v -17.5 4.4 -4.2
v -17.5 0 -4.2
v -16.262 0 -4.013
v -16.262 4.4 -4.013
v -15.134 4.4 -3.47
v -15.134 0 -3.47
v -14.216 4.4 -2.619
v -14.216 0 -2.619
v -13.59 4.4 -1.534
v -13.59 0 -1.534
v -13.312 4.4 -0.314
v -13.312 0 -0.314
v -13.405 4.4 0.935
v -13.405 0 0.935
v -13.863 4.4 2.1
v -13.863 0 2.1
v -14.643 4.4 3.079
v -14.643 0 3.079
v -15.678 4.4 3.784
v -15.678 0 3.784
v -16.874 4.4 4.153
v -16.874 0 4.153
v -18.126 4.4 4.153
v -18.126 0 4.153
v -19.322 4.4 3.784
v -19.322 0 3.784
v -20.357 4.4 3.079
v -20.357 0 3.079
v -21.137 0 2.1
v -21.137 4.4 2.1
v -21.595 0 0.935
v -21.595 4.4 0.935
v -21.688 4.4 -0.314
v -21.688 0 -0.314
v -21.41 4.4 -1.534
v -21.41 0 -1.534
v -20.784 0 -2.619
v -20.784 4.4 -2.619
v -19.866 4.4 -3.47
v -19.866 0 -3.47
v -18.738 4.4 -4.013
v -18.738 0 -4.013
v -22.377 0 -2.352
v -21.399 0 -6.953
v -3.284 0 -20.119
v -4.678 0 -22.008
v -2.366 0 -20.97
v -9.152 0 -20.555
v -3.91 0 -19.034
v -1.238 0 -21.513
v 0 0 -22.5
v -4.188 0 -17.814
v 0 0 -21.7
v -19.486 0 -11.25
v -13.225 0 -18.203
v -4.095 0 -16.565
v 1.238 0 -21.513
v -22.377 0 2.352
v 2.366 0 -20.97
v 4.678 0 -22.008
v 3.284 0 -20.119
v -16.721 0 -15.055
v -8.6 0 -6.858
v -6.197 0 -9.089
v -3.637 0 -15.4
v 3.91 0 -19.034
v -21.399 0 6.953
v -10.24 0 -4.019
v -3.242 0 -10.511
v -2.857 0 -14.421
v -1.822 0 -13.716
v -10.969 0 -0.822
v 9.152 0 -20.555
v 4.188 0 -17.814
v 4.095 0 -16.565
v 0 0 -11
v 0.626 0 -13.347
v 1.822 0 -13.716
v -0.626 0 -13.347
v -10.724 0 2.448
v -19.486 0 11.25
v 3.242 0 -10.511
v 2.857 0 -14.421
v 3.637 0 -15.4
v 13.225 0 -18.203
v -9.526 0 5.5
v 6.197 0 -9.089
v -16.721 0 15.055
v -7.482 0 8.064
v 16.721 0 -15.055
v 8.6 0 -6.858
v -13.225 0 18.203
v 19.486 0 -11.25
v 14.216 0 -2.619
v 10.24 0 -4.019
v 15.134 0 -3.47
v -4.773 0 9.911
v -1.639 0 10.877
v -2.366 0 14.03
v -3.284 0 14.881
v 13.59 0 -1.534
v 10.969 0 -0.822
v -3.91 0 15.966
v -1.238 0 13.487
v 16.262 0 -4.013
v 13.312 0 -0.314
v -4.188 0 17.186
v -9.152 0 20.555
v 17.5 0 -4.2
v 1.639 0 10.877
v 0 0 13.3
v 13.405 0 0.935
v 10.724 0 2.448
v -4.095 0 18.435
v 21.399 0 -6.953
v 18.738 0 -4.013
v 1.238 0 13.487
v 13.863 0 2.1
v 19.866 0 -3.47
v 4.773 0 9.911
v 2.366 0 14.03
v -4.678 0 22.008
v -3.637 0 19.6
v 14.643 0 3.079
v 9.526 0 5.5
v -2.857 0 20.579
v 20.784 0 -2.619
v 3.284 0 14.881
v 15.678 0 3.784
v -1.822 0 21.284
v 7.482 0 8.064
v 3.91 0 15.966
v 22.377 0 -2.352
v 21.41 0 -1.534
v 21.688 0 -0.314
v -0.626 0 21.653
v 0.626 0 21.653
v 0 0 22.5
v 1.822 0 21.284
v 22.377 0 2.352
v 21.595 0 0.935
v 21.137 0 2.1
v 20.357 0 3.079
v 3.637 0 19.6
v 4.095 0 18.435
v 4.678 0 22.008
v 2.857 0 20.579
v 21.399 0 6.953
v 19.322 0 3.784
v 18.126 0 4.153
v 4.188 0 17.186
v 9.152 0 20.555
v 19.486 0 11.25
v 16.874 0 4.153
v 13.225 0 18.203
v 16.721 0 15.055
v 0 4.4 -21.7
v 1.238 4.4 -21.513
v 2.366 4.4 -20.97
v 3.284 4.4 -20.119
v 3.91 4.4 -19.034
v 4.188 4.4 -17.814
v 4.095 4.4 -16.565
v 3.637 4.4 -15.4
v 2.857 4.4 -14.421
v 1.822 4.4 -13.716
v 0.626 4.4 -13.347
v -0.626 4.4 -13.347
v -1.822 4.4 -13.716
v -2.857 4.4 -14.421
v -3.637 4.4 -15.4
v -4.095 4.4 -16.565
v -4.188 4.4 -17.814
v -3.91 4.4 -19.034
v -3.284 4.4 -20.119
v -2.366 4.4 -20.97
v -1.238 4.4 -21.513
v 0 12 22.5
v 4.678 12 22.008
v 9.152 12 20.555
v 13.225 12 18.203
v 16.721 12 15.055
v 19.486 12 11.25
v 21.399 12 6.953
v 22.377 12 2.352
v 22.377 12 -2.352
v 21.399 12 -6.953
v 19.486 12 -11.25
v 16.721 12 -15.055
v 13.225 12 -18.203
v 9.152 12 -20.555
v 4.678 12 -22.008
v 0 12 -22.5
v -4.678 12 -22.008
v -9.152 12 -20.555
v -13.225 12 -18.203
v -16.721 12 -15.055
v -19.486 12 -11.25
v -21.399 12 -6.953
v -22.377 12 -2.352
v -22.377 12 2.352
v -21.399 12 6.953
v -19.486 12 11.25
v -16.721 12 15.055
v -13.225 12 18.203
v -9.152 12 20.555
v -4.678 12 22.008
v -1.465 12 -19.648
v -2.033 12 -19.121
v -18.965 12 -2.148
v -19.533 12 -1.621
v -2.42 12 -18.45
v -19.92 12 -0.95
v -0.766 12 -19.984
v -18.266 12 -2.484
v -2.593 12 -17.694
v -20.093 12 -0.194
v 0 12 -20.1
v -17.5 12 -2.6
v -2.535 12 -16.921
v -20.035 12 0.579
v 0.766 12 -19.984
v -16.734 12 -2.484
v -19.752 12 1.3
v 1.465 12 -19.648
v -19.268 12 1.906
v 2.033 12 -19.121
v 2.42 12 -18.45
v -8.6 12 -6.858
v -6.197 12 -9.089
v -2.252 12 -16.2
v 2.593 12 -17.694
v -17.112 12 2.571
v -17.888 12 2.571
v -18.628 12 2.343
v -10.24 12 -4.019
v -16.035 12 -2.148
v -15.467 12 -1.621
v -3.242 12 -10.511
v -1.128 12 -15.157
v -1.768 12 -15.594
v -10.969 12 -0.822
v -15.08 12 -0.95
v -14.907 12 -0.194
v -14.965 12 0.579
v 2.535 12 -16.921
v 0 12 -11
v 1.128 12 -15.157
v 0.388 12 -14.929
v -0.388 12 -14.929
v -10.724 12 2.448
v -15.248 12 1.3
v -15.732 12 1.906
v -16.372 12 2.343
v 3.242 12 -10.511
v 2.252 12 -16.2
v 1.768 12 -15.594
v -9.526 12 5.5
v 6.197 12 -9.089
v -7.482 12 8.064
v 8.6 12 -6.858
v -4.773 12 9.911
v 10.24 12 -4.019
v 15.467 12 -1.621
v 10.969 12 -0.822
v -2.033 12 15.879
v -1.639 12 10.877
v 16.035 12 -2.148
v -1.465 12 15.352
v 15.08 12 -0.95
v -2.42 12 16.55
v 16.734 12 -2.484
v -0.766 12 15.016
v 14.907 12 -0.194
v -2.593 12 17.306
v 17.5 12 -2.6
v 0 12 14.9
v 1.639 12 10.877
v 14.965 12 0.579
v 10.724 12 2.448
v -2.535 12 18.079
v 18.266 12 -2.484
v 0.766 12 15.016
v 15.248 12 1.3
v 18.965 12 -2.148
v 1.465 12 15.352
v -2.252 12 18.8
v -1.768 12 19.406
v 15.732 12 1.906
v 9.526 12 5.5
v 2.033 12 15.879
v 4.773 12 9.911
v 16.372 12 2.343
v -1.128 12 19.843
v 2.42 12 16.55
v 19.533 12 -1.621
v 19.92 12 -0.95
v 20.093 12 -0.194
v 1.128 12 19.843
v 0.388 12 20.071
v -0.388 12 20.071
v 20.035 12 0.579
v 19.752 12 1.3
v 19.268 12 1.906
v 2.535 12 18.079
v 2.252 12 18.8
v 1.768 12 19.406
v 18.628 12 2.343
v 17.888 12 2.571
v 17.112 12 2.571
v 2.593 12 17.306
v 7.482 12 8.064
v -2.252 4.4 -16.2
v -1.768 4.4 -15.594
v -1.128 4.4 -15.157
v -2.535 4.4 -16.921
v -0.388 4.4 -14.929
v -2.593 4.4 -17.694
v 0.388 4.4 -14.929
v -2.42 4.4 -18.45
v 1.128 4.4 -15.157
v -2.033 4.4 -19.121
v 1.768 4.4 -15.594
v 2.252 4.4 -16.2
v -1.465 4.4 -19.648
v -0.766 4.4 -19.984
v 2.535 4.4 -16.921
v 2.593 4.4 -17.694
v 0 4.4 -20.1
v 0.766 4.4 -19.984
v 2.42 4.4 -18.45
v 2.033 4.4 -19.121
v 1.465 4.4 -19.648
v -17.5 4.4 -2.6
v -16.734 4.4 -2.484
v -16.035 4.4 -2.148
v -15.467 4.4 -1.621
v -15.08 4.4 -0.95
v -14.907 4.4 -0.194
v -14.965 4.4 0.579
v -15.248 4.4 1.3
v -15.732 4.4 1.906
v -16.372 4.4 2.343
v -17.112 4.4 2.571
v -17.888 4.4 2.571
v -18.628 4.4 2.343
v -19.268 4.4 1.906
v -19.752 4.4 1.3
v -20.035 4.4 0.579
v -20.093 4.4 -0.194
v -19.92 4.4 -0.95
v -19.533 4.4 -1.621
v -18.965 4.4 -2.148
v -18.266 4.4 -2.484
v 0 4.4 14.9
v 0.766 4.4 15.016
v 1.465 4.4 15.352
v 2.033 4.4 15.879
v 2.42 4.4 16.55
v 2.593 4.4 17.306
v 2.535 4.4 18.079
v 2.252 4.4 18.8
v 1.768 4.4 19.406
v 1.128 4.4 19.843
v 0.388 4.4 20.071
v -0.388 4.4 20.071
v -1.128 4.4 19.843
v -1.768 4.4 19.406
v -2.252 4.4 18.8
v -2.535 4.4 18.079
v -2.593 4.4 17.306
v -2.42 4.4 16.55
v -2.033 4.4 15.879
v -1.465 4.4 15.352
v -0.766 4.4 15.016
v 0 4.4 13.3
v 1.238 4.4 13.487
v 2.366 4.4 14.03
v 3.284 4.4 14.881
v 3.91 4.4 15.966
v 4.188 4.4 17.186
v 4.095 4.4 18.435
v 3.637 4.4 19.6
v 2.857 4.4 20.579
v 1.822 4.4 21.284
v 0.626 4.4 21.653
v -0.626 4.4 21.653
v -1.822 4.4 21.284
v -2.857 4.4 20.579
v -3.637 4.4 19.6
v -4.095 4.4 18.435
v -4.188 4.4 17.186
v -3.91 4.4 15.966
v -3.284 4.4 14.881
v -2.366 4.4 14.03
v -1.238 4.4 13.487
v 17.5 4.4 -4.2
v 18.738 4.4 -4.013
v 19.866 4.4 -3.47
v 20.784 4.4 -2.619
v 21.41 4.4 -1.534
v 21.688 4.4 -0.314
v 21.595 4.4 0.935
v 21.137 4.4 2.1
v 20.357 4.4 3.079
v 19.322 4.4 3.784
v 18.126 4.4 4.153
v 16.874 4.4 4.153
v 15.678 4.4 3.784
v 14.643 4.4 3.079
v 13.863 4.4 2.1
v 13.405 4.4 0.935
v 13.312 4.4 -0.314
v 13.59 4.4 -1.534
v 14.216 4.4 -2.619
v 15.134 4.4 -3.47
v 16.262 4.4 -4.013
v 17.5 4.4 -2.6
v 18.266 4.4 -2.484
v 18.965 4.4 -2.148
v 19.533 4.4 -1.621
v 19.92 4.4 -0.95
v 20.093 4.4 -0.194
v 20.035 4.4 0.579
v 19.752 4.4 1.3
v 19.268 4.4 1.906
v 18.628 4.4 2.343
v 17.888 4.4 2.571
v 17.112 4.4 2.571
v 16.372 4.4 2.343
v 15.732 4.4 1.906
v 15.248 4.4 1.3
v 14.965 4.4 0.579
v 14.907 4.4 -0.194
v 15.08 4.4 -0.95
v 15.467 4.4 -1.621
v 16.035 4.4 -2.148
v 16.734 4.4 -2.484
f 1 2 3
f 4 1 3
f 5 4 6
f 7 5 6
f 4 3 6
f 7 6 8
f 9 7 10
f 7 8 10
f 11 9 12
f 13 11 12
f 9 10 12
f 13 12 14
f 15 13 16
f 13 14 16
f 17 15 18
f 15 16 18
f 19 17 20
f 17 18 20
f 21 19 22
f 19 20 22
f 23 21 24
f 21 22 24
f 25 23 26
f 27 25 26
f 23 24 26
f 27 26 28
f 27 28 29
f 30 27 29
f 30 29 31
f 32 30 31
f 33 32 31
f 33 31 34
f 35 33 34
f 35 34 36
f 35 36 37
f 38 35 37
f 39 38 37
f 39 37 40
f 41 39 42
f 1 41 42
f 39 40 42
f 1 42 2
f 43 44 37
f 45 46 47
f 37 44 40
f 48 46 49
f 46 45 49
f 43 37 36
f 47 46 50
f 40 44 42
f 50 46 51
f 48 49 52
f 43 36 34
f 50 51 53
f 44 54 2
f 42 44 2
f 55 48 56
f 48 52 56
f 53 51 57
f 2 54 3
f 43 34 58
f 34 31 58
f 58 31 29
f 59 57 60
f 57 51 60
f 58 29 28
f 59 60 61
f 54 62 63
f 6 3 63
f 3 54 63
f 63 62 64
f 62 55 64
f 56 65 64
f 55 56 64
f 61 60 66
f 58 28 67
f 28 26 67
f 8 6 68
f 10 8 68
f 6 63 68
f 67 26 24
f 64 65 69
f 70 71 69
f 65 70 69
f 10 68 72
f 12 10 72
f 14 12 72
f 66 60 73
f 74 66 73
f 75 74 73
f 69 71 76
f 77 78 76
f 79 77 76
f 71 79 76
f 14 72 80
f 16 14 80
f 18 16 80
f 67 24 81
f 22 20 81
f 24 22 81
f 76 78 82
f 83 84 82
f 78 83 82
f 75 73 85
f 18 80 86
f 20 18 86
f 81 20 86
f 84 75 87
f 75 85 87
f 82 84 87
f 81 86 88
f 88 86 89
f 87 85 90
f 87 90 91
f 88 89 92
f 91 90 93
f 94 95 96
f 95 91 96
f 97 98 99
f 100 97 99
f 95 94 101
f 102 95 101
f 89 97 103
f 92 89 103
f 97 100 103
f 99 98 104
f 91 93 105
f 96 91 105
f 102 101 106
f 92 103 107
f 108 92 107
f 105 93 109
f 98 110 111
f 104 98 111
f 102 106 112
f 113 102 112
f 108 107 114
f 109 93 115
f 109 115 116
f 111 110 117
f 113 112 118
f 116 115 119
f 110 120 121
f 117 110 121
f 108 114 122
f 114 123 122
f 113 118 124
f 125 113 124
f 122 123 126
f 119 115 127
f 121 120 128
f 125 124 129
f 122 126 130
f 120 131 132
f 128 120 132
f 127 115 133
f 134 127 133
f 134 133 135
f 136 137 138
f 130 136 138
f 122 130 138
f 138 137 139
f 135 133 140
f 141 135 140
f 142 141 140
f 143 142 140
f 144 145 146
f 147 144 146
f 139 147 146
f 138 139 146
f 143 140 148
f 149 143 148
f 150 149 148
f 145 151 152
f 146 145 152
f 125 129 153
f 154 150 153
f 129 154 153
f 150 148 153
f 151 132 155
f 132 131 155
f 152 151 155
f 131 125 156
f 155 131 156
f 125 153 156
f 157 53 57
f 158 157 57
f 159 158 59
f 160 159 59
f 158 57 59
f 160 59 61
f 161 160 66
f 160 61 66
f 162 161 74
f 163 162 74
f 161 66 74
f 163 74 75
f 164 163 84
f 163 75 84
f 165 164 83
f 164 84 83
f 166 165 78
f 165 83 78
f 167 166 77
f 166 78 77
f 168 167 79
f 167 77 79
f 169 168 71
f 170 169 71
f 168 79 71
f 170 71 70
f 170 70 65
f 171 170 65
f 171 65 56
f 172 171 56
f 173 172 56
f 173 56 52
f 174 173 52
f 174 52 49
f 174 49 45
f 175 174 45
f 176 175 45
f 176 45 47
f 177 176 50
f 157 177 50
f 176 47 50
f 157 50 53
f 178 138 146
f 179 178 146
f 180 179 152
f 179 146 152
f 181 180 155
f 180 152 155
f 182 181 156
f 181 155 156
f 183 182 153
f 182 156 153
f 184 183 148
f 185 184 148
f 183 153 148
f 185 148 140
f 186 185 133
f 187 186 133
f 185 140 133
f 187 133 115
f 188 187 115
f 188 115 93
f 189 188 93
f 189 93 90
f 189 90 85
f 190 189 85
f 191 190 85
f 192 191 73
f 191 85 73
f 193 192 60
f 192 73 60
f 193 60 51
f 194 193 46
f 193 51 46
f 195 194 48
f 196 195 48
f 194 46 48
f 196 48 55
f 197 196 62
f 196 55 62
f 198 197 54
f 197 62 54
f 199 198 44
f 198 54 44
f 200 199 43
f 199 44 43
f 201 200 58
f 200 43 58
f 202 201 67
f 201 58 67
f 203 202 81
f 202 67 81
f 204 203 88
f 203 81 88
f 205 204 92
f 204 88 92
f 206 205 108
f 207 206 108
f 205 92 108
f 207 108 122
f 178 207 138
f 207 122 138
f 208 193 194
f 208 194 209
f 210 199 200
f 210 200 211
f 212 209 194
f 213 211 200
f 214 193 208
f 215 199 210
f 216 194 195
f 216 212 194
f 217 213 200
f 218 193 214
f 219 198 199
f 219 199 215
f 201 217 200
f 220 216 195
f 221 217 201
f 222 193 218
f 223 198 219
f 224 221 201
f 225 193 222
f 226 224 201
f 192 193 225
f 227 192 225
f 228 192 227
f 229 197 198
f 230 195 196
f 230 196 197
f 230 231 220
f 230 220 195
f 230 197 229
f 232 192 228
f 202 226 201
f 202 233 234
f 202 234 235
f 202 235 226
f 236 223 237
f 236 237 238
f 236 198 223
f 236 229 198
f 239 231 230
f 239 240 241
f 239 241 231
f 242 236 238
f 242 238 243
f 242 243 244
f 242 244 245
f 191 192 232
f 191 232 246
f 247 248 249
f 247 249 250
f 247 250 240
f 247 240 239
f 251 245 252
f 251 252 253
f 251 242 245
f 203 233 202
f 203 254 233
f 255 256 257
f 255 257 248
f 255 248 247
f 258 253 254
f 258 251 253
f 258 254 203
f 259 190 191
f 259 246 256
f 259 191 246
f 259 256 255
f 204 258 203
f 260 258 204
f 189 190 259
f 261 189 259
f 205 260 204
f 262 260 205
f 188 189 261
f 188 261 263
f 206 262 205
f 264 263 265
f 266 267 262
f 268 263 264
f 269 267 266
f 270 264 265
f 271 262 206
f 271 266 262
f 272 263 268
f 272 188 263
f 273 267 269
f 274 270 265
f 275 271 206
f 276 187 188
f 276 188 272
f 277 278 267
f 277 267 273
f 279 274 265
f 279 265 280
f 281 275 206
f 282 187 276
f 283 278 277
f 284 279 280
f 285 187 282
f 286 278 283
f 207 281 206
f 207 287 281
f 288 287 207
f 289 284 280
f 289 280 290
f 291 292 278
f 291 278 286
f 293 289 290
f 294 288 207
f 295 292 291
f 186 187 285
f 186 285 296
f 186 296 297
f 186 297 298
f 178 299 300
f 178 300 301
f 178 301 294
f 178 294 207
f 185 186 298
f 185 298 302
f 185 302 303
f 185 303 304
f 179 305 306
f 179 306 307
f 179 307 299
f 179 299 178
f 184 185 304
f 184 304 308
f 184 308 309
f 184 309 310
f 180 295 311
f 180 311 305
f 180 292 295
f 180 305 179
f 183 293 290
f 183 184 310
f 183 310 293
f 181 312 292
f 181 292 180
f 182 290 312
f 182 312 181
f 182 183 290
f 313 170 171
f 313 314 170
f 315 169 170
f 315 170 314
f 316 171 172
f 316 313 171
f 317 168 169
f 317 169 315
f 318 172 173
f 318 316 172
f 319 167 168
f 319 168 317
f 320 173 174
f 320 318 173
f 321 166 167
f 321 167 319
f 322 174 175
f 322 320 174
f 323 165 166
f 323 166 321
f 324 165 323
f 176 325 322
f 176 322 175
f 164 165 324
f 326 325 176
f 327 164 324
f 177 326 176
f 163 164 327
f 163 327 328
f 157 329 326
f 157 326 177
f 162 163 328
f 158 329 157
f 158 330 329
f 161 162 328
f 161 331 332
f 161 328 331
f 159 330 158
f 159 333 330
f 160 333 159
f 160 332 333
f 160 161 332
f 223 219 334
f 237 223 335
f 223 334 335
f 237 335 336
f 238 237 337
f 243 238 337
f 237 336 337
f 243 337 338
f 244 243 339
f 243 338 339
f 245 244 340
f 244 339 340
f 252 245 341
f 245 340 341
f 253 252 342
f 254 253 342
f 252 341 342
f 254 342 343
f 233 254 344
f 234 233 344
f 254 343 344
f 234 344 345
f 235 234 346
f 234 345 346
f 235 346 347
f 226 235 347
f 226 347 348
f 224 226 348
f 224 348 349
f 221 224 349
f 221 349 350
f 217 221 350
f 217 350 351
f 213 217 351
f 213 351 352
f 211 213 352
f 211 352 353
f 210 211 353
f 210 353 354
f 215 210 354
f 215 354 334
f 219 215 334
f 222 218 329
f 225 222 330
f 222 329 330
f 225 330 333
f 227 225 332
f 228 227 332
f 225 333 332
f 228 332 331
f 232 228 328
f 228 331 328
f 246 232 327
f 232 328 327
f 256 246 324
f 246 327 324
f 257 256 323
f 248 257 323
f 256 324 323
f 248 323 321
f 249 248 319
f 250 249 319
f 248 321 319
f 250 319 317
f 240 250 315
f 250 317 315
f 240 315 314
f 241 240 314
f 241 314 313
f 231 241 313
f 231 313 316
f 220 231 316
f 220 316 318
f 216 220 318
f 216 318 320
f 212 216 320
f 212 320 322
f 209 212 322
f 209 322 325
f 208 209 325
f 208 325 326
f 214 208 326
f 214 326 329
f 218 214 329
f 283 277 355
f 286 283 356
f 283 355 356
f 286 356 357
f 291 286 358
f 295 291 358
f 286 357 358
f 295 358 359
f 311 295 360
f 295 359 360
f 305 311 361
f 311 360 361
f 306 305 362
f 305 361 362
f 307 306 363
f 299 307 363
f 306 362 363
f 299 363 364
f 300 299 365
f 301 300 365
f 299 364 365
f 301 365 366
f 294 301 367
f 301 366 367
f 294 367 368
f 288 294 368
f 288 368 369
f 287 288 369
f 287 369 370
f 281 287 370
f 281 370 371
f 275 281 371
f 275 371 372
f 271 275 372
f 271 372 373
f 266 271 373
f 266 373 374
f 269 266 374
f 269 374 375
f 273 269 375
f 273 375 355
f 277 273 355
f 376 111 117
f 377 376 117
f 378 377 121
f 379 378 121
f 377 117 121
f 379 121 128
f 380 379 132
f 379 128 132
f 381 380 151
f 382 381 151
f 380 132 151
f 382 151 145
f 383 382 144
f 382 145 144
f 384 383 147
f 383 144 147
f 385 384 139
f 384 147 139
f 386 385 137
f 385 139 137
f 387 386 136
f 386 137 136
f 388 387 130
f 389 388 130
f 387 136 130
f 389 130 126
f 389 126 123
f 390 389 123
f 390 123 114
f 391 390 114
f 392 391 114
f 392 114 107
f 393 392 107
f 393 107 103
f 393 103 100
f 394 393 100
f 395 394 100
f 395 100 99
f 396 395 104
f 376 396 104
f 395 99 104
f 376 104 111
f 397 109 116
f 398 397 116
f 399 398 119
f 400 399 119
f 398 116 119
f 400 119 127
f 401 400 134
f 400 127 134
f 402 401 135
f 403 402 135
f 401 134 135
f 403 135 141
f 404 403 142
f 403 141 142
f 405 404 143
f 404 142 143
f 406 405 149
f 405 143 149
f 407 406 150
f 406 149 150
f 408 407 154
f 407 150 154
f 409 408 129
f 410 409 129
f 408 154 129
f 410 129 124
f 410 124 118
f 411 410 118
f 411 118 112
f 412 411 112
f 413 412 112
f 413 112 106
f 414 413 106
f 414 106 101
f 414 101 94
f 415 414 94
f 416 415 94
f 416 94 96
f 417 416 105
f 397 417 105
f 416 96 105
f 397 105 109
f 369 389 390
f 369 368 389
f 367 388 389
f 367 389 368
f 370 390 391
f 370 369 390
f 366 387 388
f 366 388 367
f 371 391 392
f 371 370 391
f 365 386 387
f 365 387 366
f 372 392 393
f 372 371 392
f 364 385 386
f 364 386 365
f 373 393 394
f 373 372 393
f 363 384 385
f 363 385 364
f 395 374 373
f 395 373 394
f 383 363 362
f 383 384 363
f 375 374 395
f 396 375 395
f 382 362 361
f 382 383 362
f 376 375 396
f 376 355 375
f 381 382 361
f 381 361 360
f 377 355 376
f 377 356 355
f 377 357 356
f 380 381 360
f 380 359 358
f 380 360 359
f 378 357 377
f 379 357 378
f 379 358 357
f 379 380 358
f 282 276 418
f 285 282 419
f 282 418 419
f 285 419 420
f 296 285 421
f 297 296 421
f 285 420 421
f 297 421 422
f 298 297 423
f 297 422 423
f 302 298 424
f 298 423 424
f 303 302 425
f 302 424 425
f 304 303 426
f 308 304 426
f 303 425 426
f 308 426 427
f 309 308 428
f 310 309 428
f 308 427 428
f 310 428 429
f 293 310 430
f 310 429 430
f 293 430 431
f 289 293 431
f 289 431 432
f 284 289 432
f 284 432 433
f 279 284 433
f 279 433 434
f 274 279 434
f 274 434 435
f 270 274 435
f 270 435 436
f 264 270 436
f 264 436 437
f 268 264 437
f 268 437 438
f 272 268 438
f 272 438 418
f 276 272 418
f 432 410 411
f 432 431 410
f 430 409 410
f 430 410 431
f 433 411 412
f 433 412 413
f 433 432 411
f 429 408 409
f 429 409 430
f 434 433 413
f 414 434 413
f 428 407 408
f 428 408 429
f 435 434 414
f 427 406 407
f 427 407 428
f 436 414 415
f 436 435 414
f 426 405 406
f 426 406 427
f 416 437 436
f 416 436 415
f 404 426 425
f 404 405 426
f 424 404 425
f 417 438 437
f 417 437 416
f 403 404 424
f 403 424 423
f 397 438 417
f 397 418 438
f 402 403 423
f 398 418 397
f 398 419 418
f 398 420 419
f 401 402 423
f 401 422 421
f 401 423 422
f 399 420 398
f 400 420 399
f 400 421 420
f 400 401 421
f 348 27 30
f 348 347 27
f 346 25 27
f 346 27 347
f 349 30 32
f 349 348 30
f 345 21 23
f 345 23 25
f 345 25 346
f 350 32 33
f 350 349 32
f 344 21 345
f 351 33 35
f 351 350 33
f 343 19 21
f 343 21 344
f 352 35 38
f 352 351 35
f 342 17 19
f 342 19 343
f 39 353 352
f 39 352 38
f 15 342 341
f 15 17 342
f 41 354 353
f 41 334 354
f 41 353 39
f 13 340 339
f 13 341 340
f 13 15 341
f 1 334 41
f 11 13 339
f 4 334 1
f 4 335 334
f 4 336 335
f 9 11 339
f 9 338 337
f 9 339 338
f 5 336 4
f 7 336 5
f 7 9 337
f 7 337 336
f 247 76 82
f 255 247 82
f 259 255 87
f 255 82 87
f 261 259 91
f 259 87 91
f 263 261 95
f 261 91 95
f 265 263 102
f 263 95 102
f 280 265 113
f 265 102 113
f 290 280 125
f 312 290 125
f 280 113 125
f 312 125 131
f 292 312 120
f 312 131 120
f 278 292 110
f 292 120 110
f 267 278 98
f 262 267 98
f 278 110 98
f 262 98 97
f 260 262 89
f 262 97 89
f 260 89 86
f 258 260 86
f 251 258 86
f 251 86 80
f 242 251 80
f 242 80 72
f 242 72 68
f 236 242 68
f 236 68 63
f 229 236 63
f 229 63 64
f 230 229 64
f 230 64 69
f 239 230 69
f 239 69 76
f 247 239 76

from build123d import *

# Parameters (mm, degrees)
SKETCH_1_R          = 22.5
EXTRUDE_1_DEPTH     = 12
SKETCH_2_R          = 4.2
CUT_EXTRUDE_1_DEPTH = 4.4
SKETCH_3_R          = 2.6
CUT_EXTRUDE_2_DEPTH = 35.007352146
SKETCH_4_R          = 4
CUT_EXTRUDE_3_DEPTH = 35.007352146
SKETCH_5_R          = 11
CUT_EXTRUDE_4_DEPTH = 35.007352146


with BuildPart() as part:
    # 草图1 → 凸台-拉伸1 (new body)
    with BuildSketch(Plane(origin=(0, 0, 0), x_dir=(1, 0, 0), z_dir=(0, 1, 0))):
        with Locations(Location((0, 0, 0), (0, 0, 270))):
            Circle(SKETCH_1_R)
    extrude(amount=EXTRUDE_1_DEPTH)

    # 草图2 → 切除-拉伸1 (cut)
    with BuildSketch(Plane.XZ):
        with Locations(Location((17.5, 0, 0), (0, 0, 270))):
            Circle(SKETCH_2_R)
        with Locations(Location((0, 17.5, 0), (0, 0, 270))):
            Circle(SKETCH_2_R)
        with Locations(Location((-17.5, 0, 0), (0, 0, 270))):
            Circle(SKETCH_2_R)
        with Locations(Location((0, -17.5, 0), (0, 0, 270))):
            Circle(SKETCH_2_R)
    extrude(amount=-CUT_EXTRUDE_1_DEPTH, mode=Mode.SUBTRACT)

    # 草图3 → 切除-拉伸2 (cut, through all)
    with BuildSketch(Plane.XZ):
        with Locations(Location((0, 17.5, 0), (0, 0, 270))):
            Circle(SKETCH_3_R)
        with Locations(Location((17.5, 0, 0), (0, 0, 270))):
            Circle(SKETCH_3_R)
        with Locations(Location((0, -17.5, 0), (0, 0, 270))):
            Circle(SKETCH_3_R)
        with Locations(Location((-17.5, 0, 0), (0, 0, 270))):
            Circle(SKETCH_3_R)
    extrude(amount=-CUT_EXTRUDE_2_DEPTH, mode=Mode.SUBTRACT)

    # 草图4 → 切除-拉伸3 (cut, through all)
    with BuildSketch(Plane.XZ):
        with Locations(Location((0, 0, 0), (0, 0, 270))):
            Circle(SKETCH_4_R)
    extrude(amount=-CUT_EXTRUDE_3_DEPTH, mode=Mode.SUBTRACT)

    # 草图5 → 切除-拉伸4 (cut, through all)
    with BuildSketch(Plane.XZ):
        with Locations(Location((0, 0, 0), (0, 0, 270))):
            Circle(SKETCH_5_R)
    extrude(amount=-CUT_EXTRUDE_4_DEPTH, mode=Mode.SUBTRACT)


solid = part.part
